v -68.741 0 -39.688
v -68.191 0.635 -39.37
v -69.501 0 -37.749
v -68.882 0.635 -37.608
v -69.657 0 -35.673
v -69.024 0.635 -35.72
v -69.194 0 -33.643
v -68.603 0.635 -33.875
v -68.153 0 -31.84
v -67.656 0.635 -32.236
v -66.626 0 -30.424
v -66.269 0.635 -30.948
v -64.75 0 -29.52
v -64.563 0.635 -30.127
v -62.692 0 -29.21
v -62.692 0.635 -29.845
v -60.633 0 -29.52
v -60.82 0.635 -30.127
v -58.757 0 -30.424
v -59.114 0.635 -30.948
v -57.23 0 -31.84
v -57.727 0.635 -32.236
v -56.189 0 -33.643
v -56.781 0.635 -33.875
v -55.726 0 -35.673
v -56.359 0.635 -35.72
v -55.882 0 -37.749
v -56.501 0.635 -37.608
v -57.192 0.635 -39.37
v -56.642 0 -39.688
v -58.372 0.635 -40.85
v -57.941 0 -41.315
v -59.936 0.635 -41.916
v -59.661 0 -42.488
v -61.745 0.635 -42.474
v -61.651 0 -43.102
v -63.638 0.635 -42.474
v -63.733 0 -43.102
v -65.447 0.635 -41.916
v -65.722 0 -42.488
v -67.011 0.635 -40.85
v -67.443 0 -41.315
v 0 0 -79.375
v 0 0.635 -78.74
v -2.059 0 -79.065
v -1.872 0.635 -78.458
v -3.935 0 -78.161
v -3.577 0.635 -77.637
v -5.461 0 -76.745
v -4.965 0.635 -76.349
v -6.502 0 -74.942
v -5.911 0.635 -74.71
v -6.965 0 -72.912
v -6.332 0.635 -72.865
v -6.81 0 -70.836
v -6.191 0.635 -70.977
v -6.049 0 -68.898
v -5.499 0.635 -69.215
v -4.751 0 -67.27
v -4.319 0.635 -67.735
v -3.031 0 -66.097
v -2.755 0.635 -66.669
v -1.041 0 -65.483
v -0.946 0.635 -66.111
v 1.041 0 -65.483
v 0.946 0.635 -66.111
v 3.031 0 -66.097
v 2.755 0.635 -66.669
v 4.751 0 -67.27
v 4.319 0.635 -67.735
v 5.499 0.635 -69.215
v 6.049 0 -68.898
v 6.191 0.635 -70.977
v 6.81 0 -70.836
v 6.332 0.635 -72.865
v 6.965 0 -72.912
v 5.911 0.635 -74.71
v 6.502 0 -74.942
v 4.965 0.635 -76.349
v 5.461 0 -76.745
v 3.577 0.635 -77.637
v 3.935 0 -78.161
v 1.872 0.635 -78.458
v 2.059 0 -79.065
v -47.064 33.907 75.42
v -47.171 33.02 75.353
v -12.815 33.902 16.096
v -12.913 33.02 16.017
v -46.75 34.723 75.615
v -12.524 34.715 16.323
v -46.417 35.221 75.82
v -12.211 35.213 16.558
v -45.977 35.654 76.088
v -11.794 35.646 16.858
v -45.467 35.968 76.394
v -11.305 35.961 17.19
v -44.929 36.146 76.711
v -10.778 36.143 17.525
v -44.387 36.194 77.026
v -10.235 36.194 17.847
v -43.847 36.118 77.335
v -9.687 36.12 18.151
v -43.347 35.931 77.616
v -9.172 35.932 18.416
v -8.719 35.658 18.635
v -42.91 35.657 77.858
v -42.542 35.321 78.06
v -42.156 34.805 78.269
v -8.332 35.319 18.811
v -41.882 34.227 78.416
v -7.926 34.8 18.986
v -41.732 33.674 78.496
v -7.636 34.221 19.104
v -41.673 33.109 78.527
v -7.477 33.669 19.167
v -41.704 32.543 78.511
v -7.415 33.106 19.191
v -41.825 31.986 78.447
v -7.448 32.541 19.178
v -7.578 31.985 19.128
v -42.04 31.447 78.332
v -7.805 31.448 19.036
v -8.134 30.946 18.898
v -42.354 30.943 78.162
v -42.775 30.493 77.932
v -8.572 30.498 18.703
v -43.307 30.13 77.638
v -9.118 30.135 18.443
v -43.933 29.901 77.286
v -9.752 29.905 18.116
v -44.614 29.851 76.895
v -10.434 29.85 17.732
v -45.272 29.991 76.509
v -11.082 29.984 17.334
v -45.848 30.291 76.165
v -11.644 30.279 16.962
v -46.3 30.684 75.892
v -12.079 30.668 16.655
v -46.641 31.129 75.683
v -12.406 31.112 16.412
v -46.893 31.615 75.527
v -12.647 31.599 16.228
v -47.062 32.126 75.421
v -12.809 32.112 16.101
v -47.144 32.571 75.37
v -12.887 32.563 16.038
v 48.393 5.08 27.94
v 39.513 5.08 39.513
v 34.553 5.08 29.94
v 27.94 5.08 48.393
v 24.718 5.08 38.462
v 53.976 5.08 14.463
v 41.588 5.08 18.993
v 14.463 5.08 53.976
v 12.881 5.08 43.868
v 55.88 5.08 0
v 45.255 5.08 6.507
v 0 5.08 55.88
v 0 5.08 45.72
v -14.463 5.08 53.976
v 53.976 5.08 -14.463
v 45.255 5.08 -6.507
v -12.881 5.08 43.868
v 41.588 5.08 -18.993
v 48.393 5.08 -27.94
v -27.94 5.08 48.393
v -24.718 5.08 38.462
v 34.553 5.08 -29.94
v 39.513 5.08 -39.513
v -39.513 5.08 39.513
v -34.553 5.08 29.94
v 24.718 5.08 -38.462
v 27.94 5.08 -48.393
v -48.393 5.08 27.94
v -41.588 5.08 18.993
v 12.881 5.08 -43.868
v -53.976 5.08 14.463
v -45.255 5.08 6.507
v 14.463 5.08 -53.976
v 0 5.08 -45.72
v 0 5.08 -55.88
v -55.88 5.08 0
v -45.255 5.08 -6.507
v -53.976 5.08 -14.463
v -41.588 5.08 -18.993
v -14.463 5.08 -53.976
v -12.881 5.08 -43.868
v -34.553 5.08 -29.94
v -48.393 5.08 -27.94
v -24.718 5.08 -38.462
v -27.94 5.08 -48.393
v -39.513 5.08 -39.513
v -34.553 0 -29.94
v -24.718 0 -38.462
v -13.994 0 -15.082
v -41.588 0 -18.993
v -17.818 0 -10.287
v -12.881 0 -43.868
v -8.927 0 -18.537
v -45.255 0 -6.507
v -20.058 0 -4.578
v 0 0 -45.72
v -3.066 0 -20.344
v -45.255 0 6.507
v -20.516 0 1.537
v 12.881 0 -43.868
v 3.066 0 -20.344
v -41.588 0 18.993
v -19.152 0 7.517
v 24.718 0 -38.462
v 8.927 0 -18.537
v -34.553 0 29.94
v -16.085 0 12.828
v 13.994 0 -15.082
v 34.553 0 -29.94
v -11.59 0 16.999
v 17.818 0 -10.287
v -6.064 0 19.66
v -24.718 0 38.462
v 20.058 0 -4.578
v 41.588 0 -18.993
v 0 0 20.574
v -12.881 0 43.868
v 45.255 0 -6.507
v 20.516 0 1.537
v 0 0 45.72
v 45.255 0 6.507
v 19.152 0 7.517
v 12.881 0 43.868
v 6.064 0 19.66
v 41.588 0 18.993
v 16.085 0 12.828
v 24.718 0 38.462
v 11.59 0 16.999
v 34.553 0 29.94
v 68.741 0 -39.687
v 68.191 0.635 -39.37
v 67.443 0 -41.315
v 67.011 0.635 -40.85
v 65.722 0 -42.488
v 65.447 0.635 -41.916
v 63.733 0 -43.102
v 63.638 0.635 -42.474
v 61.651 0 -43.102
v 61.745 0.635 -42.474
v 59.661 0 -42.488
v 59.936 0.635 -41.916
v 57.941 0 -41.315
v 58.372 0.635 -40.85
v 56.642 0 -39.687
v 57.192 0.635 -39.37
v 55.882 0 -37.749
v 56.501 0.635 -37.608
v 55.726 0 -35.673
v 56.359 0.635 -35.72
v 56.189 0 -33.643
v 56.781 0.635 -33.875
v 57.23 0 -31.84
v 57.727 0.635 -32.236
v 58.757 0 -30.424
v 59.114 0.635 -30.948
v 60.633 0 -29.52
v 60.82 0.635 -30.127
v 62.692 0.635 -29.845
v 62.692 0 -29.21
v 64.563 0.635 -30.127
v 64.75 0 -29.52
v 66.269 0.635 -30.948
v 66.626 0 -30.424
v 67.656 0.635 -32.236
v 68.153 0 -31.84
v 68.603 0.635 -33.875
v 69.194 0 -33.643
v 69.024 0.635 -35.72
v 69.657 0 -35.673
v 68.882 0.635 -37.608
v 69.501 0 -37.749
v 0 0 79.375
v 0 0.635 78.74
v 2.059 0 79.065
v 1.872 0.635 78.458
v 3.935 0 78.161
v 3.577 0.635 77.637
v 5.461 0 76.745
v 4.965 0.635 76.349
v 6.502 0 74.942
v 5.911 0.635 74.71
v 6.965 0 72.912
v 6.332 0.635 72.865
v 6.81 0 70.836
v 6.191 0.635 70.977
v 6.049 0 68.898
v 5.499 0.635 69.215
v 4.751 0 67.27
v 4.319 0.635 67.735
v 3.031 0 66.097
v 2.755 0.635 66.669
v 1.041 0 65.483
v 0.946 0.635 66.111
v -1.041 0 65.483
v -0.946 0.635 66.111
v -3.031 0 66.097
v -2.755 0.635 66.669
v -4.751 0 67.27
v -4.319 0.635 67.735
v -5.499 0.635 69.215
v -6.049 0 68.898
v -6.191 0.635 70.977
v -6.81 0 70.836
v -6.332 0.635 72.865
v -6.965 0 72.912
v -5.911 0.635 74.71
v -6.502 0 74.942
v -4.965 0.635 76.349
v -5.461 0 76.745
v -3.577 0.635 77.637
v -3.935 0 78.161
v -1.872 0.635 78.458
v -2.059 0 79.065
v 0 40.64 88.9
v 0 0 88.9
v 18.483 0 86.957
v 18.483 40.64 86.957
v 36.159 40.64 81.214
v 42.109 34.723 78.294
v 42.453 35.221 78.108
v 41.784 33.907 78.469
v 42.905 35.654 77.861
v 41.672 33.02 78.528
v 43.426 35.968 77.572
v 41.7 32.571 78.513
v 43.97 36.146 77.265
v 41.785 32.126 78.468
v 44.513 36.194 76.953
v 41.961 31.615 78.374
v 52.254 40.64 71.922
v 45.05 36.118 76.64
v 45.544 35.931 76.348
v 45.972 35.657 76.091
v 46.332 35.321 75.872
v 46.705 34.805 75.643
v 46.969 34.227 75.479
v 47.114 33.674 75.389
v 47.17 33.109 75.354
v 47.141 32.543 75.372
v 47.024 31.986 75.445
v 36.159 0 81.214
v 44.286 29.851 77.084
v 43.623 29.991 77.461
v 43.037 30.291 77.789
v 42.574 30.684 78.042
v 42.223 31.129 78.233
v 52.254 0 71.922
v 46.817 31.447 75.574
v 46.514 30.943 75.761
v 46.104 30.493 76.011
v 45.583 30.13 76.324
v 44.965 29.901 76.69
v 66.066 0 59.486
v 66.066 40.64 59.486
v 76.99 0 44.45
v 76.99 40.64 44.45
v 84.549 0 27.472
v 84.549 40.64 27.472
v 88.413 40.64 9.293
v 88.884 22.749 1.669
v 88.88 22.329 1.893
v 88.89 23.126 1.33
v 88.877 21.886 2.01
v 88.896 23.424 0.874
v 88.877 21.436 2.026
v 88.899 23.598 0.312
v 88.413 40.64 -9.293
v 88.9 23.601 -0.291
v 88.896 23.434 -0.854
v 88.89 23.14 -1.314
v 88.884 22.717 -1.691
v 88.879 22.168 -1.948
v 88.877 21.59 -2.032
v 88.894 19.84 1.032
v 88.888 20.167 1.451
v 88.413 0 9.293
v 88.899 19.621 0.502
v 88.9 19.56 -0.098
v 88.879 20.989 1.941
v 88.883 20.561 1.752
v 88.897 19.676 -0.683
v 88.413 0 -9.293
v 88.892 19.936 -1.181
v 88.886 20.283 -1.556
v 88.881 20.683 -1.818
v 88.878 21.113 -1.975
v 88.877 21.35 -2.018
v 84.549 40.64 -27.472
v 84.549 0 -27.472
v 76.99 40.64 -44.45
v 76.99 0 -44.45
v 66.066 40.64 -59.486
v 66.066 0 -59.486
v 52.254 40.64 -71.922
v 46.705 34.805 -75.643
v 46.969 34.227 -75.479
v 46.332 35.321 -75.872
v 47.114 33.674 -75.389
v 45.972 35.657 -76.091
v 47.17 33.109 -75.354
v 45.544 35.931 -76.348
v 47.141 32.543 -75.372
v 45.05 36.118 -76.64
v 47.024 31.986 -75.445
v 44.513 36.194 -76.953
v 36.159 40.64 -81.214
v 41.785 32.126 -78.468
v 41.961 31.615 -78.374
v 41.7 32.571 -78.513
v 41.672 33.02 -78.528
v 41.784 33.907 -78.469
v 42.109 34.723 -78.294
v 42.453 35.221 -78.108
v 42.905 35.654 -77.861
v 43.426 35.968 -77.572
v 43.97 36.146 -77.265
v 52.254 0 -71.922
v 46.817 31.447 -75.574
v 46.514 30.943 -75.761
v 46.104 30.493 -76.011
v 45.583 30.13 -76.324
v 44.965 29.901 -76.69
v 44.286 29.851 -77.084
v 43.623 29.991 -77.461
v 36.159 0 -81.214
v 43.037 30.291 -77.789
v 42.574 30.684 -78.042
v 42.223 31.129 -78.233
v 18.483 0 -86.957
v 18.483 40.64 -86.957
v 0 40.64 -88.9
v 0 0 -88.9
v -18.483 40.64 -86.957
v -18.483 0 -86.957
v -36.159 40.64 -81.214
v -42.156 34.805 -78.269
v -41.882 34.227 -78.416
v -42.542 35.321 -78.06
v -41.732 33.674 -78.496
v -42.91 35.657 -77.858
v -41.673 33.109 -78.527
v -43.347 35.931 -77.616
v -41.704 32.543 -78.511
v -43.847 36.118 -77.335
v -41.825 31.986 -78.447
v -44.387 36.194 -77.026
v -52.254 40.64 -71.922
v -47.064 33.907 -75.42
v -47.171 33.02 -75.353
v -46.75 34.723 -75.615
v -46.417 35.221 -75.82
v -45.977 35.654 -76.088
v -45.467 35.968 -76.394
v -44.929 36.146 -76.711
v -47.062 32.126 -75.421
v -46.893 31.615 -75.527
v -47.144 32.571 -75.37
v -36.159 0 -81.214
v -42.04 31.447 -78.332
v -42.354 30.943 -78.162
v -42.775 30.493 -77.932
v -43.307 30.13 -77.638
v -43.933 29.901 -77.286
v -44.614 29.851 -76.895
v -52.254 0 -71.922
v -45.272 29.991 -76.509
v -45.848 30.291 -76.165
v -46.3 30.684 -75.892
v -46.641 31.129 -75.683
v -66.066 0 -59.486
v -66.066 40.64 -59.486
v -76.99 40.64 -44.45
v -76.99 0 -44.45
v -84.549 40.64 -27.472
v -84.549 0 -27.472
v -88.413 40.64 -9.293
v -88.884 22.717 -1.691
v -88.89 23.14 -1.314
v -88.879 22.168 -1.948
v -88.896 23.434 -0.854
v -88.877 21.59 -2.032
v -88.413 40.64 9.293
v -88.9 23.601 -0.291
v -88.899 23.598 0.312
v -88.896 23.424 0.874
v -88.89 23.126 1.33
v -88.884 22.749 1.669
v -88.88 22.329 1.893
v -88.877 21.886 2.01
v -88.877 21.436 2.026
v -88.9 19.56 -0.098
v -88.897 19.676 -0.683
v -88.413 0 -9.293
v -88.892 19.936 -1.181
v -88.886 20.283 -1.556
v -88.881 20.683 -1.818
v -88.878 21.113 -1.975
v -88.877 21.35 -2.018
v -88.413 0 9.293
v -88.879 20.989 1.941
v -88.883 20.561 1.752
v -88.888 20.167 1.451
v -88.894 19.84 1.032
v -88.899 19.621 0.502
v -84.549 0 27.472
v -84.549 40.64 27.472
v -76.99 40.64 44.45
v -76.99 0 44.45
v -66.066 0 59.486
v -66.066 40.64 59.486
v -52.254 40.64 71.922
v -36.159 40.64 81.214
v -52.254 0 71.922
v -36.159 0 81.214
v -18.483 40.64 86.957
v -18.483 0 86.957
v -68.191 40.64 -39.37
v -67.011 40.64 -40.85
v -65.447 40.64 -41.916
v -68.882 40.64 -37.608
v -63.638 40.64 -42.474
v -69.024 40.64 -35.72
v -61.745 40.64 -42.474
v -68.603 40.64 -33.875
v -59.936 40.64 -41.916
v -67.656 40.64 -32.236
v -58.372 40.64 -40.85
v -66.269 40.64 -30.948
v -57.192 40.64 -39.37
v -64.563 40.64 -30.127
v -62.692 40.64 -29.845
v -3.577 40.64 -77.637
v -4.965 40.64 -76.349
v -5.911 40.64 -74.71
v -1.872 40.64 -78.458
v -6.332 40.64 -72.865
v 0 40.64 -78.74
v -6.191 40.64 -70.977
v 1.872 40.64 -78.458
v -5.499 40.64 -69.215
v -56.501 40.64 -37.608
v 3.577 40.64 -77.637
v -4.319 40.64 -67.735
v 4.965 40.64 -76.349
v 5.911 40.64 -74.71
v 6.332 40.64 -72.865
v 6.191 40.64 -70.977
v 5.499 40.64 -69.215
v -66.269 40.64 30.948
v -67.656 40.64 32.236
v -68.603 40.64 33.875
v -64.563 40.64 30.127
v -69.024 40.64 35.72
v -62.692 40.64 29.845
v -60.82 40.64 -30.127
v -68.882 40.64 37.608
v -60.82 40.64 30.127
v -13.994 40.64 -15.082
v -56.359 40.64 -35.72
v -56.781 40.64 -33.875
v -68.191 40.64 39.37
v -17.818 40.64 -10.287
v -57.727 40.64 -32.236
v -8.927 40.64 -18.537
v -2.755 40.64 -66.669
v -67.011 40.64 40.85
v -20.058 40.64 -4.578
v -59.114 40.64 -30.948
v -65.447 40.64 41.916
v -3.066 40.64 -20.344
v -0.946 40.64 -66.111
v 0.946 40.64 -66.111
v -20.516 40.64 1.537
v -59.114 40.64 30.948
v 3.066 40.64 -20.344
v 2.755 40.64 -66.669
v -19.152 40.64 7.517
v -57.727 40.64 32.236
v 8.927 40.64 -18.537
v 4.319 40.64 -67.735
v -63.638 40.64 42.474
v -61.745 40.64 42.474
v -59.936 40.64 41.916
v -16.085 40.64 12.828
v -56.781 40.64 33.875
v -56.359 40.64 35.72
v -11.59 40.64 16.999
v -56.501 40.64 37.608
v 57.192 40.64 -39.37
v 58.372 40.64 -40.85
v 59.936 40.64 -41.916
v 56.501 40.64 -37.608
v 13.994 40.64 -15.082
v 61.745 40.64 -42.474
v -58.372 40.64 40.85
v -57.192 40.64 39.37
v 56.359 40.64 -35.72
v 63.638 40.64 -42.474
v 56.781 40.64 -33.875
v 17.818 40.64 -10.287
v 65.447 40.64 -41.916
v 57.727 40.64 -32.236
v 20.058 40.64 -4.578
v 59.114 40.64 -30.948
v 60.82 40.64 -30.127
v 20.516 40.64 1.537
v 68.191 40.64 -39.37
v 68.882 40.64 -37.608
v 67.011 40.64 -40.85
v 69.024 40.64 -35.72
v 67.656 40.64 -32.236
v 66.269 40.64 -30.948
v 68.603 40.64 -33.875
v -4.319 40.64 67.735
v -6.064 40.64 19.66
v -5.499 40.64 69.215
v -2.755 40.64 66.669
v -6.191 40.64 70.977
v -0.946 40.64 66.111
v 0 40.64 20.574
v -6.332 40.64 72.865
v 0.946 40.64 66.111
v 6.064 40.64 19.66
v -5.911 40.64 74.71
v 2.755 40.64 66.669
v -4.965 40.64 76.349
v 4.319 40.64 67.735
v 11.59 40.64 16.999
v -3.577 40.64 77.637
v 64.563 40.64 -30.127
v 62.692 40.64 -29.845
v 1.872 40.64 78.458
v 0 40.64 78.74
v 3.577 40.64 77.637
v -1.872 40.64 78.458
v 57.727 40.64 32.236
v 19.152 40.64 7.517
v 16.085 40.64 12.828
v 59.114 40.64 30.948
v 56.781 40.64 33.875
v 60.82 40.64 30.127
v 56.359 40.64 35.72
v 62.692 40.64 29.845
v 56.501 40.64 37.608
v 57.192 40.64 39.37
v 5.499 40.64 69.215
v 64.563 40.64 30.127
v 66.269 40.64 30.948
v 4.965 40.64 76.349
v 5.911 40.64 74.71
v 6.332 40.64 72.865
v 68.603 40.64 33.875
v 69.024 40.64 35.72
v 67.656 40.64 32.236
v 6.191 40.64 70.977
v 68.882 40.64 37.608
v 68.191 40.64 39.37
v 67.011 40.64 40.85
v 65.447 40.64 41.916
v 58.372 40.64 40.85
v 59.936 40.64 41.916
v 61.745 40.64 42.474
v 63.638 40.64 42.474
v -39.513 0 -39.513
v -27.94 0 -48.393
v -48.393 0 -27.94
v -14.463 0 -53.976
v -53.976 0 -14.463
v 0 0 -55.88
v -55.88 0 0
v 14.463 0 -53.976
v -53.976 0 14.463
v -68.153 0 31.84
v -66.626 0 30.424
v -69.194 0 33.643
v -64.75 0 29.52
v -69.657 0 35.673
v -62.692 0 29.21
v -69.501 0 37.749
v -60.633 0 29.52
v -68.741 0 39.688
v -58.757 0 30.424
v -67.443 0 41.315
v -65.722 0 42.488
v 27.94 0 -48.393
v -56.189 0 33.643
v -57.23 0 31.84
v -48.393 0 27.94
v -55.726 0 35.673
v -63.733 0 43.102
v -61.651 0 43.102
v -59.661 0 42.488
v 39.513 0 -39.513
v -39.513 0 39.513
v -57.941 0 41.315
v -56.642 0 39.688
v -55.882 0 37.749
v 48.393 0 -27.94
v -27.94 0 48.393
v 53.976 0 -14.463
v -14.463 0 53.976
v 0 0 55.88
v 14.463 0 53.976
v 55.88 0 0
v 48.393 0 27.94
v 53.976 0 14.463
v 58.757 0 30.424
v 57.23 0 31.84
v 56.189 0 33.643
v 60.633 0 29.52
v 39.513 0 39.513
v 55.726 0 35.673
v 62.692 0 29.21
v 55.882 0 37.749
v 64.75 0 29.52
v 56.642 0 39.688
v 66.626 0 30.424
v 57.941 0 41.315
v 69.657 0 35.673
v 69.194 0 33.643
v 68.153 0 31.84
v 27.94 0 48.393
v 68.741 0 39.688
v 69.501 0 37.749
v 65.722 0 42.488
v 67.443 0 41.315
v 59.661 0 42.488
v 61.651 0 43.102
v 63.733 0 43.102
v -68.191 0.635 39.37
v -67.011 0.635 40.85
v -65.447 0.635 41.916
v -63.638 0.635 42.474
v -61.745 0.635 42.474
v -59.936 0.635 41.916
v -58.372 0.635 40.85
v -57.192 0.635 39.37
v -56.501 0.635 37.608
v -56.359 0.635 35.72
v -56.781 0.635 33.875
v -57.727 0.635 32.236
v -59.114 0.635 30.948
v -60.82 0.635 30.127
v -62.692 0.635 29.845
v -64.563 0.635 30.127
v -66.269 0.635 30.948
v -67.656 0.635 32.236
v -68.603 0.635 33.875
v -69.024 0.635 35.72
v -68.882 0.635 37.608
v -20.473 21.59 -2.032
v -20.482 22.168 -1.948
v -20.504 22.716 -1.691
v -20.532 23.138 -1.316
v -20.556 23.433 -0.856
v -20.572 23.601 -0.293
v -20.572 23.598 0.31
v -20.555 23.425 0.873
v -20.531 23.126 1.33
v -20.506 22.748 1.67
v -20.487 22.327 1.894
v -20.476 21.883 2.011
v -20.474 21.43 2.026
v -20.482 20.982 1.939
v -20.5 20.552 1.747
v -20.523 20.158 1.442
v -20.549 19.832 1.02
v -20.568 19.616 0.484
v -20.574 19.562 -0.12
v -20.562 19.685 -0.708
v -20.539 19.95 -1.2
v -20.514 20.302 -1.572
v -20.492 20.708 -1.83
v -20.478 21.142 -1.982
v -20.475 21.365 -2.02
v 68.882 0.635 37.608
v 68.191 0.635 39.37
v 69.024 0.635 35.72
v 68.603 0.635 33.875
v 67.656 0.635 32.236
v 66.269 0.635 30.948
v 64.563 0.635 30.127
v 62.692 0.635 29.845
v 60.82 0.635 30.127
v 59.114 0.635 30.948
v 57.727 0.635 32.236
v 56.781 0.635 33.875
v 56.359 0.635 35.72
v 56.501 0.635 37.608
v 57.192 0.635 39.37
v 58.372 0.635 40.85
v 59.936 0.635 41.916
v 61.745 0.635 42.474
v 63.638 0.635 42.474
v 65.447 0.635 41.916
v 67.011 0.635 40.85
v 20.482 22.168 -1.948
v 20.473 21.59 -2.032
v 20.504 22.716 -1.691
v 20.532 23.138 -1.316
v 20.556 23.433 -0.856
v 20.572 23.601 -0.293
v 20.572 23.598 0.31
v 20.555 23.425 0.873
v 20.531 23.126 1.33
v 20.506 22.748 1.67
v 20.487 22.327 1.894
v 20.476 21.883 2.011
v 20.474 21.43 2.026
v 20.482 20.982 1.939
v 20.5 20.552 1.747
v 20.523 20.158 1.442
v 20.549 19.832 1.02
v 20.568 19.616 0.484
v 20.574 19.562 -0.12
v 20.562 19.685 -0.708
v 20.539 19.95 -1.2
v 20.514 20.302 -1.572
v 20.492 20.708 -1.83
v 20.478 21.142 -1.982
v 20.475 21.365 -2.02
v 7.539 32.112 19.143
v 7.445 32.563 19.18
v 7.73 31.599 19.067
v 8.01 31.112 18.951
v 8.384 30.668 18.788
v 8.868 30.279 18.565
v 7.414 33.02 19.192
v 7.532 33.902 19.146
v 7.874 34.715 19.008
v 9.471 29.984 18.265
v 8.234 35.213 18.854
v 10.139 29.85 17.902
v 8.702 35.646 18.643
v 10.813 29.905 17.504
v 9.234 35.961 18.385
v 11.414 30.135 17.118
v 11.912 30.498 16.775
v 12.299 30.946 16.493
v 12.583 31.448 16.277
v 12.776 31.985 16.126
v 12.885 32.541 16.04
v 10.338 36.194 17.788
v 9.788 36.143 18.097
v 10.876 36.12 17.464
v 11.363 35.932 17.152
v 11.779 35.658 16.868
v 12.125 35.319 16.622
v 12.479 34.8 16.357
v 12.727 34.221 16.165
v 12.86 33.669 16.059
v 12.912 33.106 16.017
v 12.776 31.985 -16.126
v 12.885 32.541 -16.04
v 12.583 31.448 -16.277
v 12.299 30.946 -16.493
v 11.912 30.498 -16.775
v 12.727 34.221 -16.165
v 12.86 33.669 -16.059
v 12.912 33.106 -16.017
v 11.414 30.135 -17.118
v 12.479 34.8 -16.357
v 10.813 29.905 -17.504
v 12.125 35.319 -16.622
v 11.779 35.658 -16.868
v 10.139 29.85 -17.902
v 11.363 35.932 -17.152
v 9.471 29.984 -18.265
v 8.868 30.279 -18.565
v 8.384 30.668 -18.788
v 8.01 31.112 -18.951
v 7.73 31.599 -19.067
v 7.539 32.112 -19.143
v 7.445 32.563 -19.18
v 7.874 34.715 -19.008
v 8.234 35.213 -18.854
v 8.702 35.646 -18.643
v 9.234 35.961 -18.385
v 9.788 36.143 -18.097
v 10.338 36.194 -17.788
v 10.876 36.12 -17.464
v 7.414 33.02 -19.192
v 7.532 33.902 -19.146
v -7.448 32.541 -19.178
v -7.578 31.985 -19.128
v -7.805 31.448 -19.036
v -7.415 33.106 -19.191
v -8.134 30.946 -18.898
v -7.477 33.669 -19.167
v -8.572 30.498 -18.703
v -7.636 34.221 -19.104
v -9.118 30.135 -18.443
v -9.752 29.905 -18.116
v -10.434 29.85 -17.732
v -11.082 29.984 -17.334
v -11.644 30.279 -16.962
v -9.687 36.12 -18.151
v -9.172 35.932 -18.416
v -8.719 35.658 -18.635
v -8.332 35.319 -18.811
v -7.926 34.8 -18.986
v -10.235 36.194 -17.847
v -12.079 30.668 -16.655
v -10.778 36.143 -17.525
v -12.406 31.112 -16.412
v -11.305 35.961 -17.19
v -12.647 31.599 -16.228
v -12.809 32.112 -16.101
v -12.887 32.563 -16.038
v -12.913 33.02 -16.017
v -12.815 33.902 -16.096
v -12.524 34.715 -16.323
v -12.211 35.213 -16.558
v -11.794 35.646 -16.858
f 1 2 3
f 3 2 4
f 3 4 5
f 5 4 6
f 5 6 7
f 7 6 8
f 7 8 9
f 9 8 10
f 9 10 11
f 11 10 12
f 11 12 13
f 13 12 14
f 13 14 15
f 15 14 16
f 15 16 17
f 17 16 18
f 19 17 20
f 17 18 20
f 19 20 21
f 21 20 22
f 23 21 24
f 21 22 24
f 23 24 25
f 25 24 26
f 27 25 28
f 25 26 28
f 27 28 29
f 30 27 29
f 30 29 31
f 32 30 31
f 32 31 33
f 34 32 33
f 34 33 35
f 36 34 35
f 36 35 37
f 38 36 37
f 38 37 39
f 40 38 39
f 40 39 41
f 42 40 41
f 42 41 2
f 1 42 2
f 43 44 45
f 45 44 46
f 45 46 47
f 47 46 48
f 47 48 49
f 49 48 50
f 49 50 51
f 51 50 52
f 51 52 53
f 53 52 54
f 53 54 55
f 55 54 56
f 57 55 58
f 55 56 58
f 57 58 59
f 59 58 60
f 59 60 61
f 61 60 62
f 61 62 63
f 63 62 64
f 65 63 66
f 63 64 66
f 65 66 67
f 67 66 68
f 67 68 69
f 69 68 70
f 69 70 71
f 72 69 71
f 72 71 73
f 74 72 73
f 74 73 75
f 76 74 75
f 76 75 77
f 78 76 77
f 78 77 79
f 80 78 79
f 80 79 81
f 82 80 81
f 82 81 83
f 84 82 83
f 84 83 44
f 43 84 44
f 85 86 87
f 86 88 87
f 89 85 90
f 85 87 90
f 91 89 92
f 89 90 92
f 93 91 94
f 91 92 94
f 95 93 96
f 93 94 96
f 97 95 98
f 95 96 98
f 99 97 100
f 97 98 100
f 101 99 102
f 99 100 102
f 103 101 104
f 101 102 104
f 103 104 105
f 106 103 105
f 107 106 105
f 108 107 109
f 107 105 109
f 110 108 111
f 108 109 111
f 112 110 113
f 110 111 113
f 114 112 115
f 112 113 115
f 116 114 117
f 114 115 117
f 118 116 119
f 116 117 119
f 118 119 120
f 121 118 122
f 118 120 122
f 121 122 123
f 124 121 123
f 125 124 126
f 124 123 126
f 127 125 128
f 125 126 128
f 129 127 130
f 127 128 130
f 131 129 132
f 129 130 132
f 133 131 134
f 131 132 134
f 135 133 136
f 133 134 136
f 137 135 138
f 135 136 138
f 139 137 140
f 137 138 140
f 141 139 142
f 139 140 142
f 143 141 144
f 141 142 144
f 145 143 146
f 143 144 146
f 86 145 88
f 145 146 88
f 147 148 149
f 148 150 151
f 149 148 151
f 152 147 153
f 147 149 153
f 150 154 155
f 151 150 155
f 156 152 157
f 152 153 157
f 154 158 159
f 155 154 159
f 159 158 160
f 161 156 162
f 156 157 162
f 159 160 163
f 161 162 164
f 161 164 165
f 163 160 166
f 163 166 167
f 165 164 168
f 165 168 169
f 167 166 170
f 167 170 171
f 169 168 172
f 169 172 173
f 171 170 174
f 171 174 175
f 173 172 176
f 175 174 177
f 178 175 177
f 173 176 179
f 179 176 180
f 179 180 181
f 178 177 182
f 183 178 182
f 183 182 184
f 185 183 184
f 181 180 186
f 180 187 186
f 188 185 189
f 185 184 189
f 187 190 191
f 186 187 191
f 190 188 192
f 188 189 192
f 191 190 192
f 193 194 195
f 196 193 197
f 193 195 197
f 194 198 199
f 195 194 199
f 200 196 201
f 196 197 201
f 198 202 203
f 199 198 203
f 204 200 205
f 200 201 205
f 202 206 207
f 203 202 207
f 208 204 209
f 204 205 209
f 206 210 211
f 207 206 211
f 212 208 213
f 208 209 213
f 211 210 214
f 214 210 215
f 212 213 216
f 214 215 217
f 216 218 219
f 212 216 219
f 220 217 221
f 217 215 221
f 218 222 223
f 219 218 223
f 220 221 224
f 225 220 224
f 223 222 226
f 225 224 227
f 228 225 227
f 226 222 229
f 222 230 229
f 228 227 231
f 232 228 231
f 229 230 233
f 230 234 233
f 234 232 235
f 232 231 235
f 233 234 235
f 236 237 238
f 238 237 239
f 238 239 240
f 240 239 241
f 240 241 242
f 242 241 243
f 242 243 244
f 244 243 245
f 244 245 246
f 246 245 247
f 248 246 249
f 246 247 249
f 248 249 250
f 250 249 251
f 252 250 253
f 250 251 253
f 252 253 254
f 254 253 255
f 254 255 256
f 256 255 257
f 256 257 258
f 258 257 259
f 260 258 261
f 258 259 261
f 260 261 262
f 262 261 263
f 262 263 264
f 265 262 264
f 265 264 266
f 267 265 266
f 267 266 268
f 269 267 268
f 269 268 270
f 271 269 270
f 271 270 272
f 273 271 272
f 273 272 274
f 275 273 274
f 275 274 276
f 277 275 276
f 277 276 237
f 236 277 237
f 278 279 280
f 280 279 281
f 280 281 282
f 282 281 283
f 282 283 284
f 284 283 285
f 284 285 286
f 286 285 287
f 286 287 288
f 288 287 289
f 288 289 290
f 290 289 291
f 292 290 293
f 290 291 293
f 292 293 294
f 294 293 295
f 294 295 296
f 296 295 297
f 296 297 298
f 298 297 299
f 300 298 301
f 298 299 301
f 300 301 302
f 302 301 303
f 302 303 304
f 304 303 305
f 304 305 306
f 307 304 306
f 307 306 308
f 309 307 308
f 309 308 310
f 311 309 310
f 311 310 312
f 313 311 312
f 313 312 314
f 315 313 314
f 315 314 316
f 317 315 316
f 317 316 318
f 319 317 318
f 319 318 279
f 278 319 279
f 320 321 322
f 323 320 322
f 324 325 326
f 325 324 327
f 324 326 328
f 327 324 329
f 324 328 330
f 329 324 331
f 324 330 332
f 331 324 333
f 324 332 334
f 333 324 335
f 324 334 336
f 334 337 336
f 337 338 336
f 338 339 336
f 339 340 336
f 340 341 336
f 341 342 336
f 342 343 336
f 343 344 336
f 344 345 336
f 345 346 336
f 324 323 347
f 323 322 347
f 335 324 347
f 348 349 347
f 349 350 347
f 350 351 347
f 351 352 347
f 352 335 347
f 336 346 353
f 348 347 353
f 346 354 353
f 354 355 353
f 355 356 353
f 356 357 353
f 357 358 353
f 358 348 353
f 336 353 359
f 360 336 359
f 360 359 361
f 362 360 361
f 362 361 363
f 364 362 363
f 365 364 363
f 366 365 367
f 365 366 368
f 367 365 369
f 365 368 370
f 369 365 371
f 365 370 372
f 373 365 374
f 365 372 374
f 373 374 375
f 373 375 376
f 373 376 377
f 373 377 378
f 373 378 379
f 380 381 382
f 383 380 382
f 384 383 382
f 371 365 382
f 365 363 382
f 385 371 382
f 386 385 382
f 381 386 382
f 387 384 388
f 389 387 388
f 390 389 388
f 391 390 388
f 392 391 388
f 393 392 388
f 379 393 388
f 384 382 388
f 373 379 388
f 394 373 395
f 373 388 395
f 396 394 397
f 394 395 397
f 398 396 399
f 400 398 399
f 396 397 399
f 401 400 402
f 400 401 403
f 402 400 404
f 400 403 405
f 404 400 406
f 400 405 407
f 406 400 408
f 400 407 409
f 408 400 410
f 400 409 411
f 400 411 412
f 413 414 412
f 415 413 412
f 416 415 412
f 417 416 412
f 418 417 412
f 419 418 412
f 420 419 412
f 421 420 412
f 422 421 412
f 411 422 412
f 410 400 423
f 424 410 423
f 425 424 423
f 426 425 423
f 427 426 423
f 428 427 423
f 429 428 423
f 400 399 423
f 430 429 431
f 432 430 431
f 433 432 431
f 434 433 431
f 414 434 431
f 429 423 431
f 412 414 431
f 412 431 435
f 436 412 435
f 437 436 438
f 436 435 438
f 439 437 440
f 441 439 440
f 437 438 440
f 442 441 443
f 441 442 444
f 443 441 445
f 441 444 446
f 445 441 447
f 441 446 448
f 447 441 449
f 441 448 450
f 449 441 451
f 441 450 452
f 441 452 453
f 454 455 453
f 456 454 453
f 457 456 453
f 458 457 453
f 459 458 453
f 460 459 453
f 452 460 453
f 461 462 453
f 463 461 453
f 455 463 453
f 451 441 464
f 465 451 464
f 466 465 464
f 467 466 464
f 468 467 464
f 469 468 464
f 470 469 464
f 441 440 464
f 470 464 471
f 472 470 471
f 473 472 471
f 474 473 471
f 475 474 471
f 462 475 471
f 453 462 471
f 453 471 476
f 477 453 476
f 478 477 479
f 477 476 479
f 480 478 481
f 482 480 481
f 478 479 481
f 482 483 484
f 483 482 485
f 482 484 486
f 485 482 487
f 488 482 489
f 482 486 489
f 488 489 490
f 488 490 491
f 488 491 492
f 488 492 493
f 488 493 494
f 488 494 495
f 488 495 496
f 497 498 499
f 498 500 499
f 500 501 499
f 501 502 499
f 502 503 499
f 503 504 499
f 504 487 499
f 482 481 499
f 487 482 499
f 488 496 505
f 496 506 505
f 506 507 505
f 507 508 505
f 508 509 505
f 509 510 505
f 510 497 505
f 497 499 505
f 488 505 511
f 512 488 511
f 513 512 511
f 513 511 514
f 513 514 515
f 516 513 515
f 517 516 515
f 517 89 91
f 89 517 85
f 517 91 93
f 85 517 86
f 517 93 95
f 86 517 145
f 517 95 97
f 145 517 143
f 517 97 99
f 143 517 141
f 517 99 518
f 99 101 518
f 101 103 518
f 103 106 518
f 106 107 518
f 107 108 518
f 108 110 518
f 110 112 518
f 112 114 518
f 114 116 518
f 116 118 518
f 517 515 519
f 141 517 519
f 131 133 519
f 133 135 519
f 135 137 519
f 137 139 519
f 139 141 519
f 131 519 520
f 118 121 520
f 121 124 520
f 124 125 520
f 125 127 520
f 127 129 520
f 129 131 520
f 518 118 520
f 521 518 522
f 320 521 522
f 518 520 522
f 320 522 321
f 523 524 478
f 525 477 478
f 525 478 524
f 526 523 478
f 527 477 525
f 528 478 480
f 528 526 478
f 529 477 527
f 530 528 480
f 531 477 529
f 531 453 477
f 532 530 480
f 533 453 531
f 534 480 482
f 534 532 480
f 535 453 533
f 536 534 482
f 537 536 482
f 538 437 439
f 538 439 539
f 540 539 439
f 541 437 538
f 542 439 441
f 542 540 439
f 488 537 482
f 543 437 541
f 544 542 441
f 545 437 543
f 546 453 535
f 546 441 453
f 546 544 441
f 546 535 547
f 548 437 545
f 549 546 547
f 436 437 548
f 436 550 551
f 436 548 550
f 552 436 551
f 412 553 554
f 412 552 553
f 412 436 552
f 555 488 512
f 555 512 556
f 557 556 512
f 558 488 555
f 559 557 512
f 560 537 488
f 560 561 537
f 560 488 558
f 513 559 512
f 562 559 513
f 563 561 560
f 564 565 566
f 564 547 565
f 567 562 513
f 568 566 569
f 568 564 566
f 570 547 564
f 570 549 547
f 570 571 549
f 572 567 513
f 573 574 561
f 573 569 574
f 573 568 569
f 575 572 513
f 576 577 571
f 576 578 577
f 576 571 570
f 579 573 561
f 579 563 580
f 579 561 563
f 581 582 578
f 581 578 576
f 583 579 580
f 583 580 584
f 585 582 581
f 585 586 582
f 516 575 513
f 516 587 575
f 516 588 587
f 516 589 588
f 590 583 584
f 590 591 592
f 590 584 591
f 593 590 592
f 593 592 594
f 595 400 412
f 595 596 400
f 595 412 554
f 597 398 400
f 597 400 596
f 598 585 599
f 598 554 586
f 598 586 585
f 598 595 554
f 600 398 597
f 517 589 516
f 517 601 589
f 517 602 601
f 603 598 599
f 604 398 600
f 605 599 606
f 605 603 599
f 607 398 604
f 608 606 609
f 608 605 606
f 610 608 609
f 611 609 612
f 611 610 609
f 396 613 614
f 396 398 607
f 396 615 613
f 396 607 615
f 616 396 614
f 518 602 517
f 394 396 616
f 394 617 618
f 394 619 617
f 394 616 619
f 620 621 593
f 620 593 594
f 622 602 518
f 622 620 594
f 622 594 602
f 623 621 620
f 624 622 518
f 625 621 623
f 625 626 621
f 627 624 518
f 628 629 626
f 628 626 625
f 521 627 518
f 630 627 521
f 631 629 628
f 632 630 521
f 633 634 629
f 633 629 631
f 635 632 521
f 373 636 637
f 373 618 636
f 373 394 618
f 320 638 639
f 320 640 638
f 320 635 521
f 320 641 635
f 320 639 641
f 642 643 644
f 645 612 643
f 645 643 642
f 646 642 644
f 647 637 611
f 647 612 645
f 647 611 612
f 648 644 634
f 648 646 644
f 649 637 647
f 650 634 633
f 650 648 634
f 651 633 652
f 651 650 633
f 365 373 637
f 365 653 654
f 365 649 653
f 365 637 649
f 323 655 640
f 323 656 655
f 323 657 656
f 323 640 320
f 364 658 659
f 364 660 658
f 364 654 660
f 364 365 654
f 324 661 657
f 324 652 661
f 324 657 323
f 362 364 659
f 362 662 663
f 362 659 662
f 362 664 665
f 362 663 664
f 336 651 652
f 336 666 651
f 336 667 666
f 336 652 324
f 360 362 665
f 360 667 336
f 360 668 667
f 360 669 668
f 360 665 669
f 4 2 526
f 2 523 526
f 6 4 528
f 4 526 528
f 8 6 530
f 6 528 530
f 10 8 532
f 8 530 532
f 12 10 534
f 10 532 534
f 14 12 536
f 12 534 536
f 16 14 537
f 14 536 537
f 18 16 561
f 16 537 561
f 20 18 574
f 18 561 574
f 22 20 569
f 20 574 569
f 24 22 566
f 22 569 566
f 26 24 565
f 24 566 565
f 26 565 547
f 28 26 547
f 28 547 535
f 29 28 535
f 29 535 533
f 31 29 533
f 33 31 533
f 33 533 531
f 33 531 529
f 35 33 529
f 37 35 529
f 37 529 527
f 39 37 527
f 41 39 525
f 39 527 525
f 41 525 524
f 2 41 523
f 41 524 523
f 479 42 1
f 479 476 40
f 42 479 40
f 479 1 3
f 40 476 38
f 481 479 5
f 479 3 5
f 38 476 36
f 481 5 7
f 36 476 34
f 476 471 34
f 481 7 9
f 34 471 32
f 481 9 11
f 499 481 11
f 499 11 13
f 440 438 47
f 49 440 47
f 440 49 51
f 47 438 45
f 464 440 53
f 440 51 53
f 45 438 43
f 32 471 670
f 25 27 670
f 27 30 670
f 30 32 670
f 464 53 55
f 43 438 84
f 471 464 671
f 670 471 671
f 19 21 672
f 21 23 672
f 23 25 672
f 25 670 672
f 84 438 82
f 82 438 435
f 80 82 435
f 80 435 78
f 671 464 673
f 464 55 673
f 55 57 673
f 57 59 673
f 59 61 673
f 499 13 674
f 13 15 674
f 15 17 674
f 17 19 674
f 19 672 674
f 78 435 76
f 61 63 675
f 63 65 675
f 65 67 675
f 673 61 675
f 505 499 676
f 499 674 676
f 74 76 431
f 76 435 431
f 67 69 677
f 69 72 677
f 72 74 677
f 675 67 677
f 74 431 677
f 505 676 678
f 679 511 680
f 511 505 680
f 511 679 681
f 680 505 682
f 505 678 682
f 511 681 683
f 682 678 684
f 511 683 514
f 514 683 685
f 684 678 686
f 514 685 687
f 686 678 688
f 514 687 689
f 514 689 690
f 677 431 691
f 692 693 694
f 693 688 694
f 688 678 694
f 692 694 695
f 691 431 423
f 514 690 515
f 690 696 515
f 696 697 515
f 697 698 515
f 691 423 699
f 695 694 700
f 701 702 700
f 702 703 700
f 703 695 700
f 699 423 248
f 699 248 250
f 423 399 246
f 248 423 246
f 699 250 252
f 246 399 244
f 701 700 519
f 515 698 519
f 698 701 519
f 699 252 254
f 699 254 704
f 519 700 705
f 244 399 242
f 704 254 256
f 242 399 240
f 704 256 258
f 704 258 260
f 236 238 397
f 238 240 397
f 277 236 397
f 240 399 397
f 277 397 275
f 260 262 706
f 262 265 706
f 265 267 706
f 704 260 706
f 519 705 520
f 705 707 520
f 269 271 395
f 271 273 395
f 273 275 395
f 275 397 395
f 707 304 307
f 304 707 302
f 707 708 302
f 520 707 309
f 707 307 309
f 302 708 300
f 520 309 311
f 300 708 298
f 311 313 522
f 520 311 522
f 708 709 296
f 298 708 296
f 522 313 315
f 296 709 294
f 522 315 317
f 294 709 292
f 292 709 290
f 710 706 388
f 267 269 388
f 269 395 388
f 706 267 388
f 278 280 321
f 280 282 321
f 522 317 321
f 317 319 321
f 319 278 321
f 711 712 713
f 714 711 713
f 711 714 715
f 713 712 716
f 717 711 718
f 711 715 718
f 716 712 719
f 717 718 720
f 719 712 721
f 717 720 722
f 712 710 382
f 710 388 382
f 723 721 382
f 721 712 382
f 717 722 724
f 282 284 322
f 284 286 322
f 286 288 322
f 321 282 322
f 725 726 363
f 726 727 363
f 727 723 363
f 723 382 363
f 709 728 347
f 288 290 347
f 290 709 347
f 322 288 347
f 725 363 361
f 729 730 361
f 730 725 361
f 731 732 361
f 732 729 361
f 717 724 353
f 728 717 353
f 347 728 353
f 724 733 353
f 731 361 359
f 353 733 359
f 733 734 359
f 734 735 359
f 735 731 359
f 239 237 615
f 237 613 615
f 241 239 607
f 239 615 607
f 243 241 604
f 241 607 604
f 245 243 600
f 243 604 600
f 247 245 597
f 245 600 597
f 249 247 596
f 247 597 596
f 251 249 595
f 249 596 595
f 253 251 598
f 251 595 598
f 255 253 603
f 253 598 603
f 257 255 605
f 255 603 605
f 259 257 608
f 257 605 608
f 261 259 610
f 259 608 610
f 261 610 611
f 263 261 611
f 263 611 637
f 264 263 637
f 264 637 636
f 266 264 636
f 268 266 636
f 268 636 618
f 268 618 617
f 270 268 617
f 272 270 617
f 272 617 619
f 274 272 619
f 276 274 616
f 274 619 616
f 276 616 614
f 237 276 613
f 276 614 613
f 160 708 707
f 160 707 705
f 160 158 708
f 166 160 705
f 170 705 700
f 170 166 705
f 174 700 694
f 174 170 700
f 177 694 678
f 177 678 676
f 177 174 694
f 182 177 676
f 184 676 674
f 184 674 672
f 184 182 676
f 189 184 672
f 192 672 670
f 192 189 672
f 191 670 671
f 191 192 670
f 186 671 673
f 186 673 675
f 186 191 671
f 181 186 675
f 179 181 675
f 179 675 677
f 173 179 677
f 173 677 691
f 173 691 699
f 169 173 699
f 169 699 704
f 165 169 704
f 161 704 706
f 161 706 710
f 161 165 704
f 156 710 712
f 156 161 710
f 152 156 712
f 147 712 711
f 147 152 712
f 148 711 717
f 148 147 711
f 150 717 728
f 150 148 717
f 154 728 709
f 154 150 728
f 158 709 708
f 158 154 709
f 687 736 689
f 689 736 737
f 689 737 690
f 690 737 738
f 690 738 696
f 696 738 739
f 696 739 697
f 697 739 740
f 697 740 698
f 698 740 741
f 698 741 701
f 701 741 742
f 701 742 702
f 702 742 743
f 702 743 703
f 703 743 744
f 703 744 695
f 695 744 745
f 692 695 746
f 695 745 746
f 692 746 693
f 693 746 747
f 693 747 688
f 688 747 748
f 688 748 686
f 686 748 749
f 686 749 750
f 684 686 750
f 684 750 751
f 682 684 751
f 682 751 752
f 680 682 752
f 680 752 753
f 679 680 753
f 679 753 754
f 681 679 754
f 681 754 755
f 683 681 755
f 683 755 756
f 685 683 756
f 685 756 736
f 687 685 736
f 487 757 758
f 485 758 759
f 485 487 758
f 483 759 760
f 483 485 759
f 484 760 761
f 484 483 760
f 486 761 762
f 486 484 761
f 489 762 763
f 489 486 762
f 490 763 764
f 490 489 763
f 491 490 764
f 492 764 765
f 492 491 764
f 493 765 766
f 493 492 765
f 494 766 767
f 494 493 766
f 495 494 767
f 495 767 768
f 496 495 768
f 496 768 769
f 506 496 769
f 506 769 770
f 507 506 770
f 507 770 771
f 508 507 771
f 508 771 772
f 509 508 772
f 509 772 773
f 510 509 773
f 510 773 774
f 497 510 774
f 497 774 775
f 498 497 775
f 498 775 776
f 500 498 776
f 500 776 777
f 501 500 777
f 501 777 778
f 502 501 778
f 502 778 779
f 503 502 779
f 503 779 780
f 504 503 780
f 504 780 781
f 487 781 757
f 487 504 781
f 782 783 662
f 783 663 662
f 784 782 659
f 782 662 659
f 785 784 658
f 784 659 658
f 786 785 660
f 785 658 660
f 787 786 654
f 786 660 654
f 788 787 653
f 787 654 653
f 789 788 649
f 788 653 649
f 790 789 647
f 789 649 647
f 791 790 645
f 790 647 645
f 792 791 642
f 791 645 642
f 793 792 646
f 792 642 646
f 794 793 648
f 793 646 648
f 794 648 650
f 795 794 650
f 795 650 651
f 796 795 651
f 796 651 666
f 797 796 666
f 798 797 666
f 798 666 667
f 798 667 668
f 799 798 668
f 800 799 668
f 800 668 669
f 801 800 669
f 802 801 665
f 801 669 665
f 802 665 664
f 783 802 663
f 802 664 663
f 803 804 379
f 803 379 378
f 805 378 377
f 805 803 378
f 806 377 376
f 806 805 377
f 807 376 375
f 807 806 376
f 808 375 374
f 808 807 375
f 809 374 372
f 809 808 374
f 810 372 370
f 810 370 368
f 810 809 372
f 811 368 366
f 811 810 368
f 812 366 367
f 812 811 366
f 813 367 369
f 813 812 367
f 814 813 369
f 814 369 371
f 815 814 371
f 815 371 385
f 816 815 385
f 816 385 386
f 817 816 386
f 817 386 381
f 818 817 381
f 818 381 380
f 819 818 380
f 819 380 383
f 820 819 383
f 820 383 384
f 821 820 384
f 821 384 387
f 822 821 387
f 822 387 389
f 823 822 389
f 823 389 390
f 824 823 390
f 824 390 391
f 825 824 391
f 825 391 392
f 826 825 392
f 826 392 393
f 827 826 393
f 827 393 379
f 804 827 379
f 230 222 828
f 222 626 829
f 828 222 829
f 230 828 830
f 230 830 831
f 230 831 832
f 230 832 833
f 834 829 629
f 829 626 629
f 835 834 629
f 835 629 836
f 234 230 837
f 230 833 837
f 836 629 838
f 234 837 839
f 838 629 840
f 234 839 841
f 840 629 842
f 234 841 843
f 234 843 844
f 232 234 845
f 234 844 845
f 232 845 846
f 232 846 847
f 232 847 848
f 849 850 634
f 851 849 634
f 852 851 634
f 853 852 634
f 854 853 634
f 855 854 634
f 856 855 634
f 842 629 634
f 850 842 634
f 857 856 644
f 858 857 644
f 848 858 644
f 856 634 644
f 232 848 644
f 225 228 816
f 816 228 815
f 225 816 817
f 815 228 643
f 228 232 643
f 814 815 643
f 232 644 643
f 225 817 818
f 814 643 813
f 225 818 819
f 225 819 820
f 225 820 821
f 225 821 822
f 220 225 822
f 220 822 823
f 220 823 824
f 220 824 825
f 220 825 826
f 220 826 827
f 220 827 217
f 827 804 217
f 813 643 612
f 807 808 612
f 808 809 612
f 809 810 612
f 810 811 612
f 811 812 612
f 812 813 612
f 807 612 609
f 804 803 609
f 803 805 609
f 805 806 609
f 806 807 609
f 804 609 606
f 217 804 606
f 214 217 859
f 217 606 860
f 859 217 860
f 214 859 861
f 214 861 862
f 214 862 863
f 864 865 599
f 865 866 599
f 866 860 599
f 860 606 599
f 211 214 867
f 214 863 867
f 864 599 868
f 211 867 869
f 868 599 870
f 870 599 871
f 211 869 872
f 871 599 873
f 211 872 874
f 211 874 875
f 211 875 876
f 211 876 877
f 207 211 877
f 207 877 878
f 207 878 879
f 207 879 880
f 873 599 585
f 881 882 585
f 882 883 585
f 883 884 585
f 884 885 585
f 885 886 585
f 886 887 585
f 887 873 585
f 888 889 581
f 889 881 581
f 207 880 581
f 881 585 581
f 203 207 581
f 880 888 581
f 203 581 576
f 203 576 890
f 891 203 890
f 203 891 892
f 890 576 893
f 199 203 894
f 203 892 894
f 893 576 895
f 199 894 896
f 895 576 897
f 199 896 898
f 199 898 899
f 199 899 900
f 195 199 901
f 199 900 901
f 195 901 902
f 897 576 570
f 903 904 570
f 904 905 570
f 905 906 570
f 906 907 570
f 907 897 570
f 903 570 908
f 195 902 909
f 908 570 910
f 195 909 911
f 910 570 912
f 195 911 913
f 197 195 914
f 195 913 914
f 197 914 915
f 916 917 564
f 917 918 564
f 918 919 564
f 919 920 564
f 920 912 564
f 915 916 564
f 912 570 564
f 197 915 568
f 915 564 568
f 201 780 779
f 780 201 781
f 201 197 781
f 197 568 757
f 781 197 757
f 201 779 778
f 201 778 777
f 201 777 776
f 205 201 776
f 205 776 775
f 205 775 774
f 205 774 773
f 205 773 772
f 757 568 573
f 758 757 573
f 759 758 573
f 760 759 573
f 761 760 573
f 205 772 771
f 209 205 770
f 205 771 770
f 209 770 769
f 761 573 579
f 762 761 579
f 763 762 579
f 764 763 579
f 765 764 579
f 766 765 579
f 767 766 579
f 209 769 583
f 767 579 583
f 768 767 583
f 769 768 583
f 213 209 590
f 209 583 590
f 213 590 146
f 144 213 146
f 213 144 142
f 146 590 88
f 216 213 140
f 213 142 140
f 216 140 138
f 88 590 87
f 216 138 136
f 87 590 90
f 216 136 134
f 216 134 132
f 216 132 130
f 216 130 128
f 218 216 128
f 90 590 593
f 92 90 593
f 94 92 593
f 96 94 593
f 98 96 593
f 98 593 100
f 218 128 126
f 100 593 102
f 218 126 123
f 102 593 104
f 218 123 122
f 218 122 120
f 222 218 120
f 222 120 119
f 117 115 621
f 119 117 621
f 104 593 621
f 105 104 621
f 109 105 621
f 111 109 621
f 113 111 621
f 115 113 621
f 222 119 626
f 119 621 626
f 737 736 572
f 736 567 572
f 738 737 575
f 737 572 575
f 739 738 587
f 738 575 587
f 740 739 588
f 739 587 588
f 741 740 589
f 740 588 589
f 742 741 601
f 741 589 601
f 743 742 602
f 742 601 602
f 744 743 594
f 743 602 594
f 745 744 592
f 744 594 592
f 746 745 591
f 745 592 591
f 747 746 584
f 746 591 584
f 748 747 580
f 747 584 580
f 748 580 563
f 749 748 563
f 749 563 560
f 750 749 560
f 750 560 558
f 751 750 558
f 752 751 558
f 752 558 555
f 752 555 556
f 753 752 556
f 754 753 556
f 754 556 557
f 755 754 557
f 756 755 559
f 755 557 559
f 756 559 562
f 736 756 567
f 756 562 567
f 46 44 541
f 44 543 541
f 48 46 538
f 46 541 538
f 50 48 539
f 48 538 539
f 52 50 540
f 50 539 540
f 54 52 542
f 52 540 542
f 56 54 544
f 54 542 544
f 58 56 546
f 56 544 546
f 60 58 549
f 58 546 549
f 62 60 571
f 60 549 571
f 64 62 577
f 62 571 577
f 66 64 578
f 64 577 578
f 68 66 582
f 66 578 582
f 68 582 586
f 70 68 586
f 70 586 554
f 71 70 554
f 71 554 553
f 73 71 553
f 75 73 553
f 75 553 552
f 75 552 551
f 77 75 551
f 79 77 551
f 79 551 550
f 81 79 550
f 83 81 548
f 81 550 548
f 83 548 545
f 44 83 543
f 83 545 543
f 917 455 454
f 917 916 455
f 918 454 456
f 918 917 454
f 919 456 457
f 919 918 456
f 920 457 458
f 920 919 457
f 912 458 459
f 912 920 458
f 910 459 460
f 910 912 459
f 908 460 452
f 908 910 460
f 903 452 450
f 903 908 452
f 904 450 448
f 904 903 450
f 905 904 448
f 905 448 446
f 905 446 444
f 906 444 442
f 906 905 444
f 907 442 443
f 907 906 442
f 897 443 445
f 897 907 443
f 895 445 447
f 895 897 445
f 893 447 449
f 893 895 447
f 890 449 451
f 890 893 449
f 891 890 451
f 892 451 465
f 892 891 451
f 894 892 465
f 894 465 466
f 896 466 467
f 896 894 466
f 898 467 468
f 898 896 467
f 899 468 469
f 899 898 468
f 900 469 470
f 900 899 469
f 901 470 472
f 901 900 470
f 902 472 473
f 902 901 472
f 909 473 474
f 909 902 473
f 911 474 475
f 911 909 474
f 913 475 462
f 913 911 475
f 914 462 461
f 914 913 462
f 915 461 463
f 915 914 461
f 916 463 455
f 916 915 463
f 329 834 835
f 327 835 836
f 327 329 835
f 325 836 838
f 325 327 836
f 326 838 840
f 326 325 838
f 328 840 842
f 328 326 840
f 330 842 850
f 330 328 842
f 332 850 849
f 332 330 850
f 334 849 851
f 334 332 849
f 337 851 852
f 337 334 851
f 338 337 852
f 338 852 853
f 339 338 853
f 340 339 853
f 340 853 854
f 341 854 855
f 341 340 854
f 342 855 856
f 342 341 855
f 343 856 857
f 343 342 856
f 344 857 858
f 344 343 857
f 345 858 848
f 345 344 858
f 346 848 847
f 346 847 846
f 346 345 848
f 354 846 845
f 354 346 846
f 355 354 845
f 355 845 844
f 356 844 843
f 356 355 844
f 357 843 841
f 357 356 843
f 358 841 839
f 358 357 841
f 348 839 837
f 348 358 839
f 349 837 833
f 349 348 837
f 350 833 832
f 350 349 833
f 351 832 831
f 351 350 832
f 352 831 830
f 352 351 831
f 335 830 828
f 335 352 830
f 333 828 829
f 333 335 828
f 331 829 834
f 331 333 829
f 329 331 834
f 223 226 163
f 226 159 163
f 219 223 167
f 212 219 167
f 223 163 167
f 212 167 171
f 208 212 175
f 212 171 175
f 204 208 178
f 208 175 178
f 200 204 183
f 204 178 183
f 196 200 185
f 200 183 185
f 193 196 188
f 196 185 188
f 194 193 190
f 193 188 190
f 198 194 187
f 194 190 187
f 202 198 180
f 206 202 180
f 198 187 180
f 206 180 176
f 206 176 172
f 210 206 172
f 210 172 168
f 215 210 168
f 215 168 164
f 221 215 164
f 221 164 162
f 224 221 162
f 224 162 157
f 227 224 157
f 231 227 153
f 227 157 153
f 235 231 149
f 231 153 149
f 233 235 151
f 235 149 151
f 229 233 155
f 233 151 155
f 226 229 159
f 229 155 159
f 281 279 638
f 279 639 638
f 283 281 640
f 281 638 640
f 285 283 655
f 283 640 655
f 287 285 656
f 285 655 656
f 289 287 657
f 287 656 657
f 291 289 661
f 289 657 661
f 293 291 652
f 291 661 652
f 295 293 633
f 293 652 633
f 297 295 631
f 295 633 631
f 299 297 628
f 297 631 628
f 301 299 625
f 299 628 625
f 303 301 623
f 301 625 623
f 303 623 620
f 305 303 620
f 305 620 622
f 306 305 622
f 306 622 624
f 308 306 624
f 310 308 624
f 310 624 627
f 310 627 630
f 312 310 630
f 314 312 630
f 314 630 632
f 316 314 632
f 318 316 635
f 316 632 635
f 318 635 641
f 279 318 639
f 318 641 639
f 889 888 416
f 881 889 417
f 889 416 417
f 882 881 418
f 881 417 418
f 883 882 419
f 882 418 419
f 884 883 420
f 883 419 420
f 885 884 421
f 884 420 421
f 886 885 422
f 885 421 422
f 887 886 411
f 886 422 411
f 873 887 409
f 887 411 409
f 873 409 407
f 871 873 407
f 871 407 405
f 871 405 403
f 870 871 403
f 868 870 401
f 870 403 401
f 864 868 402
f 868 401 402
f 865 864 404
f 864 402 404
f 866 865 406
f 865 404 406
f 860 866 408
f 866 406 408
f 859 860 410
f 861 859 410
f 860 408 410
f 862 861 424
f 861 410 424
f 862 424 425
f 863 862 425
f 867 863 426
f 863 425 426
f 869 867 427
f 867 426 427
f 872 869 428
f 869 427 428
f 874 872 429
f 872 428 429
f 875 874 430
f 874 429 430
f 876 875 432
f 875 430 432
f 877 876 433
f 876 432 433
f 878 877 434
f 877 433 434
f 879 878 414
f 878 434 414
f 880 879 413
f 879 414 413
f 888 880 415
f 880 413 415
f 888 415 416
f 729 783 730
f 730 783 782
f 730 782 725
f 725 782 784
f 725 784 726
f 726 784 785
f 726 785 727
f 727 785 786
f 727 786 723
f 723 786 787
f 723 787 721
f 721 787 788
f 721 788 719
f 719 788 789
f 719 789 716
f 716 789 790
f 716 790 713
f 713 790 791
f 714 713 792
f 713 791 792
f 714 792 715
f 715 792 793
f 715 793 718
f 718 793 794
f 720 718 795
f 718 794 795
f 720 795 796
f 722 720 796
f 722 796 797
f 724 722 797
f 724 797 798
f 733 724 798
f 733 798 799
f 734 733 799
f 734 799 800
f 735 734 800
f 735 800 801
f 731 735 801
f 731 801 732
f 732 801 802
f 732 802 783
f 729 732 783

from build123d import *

# Parameters (mm, degrees)
SKETCH1_R                            = 88.9
BOSS_EXTRUDE1_DEPTH                  = 40.64
SKETCH2_R                            = 20.574
CUT_EXTRUDE1_DEPTH                   = 133.128837125
CUT_EXTRUDE4_DEPTH                   = 133.128837125
CUT_EXTRUDE4_DEPTH_BACK              = 133.128837125
SKETCH3_R                            = 2.032
SKETCH6_R                            = 3.175
CUT_EXTRUDE5_DEPTH                   = 133.128837297
F_1_2_0_5_DIAMETER_HOLE1_D           = 12.7
F_1_2_0_5_DIAMETER_HOLE1_CSINK_D     = 13.97
F_1_2_0_5_DIAMETER_HOLE1_CSINK_ANGLE = 90
CIRPATTERN1_COUNT                    = 6
SKETCH9_W                            = 10.16
SKETCH9_H                            = 5.08


with BuildPart() as part:
    # Sketch1 → Boss-Extrude1 (new body)
    with BuildSketch(Plane(origin=(0, 0, 0), x_dir=(1, 0, 0), z_dir=(0, 1, 0))):
        with Locations(Location((0, 0, 0), (0, 0, 270))):
            Circle(SKETCH1_R)
    extrude(amount=BOSS_EXTRUDE1_DEPTH)

    # Sketch2 → Cut-Extrude1 (cut, through all)
    with BuildSketch(Plane(origin=(0, 40.64, 0), x_dir=(1, 0, 0), z_dir=(0, 1, 0))):
        with Locations(Location((0, 0, 0), (0, 0, 270))):
            Circle(SKETCH2_R)
    extrude(amount=-CUT_EXTRUDE1_DEPTH, mode=Mode.SUBTRACT)

    # Sketch3 → Cut-Extrude4 (cut, two sides: drawn at the far end of the back side and taken through both)
    with BuildSketch(Plane(origin=(0, 0, 0), x_dir=(0, 0, -1), z_dir=(1, 0, 0)).offset(-CUT_EXTRUDE4_DEPTH_BACK)):
        with Locations((0, 21.59)):
            Circle(SKETCH3_R)
    extrude(amount=CUT_EXTRUDE4_DEPTH + CUT_EXTRUDE4_DEPTH_BACK, mode=Mode.SUBTRACT)

    # Sketch6 → Cut-Extrude5 (cut, symmetric)
    with BuildSketch(Plane(origin=(0, 0, 0), x_dir=(0, 1, 0), z_dir=(0.499999999999998, 0, -0.8660254037844398))):
        with Locations(Location((33.02, 0, 0), (0, 0, 270))):
            Circle(SKETCH6_R)
    cut_extrude5 = extrude(amount=CUT_EXTRUDE5_DEPTH, both=True, mode=Mode.SUBTRACT)

    # Mirror1: Cut-Extrude5 across plane
    add(cut_extrude5.mirror(Plane.XY), mode=Mode.SUBTRACT)

    # 1/2 (0.5) Diameter Hole1 (through all)
    with Locations(Plane(origin=(0, 0, 72.39), x_dir=(0, 0, -1), z_dir=(0, -1, 0))):
        with Locations((0, 0)):
            f_1_2_0_5_diameter_hole1 = CounterSinkHole(F_1_2_0_5_DIAMETER_HOLE1_D / 2, F_1_2_0_5_DIAMETER_HOLE1_CSINK_D / 2, counter_sink_angle=F_1_2_0_5_DIAMETER_HOLE1_CSINK_ANGLE)

    # CirPattern1: 1/2 (0.5) Diameter Hole1 ×6 about axis
    cirpattern1_axis = Axis((0, 0, 0), (0, 1, 0))
    for i in range(1, CIRPATTERN1_COUNT):
        add(f_1_2_0_5_diameter_hole1.rotate(cirpattern1_axis, i * 360 / CIRPATTERN1_COUNT), mode=Mode.SUBTRACT)

    # Sketch9 → Cut-Revolve1 (revolve, cut)
    with BuildSketch(Plane.XY, mode=Mode.PRIVATE) as cut_revolve1_sk:
        with Locations((50.8, 2.54)):
            Rectangle(SKETCH9_W, SKETCH9_H)
    revolve(cut_revolve1_sk.sketch.rotate(Axis((0, 40.64, 0), (0, -1, 0)), 90), axis=Axis((0, 40.64, 0), (0, -1, 0)), mode=Mode.SUBTRACT)


solid = part.part
